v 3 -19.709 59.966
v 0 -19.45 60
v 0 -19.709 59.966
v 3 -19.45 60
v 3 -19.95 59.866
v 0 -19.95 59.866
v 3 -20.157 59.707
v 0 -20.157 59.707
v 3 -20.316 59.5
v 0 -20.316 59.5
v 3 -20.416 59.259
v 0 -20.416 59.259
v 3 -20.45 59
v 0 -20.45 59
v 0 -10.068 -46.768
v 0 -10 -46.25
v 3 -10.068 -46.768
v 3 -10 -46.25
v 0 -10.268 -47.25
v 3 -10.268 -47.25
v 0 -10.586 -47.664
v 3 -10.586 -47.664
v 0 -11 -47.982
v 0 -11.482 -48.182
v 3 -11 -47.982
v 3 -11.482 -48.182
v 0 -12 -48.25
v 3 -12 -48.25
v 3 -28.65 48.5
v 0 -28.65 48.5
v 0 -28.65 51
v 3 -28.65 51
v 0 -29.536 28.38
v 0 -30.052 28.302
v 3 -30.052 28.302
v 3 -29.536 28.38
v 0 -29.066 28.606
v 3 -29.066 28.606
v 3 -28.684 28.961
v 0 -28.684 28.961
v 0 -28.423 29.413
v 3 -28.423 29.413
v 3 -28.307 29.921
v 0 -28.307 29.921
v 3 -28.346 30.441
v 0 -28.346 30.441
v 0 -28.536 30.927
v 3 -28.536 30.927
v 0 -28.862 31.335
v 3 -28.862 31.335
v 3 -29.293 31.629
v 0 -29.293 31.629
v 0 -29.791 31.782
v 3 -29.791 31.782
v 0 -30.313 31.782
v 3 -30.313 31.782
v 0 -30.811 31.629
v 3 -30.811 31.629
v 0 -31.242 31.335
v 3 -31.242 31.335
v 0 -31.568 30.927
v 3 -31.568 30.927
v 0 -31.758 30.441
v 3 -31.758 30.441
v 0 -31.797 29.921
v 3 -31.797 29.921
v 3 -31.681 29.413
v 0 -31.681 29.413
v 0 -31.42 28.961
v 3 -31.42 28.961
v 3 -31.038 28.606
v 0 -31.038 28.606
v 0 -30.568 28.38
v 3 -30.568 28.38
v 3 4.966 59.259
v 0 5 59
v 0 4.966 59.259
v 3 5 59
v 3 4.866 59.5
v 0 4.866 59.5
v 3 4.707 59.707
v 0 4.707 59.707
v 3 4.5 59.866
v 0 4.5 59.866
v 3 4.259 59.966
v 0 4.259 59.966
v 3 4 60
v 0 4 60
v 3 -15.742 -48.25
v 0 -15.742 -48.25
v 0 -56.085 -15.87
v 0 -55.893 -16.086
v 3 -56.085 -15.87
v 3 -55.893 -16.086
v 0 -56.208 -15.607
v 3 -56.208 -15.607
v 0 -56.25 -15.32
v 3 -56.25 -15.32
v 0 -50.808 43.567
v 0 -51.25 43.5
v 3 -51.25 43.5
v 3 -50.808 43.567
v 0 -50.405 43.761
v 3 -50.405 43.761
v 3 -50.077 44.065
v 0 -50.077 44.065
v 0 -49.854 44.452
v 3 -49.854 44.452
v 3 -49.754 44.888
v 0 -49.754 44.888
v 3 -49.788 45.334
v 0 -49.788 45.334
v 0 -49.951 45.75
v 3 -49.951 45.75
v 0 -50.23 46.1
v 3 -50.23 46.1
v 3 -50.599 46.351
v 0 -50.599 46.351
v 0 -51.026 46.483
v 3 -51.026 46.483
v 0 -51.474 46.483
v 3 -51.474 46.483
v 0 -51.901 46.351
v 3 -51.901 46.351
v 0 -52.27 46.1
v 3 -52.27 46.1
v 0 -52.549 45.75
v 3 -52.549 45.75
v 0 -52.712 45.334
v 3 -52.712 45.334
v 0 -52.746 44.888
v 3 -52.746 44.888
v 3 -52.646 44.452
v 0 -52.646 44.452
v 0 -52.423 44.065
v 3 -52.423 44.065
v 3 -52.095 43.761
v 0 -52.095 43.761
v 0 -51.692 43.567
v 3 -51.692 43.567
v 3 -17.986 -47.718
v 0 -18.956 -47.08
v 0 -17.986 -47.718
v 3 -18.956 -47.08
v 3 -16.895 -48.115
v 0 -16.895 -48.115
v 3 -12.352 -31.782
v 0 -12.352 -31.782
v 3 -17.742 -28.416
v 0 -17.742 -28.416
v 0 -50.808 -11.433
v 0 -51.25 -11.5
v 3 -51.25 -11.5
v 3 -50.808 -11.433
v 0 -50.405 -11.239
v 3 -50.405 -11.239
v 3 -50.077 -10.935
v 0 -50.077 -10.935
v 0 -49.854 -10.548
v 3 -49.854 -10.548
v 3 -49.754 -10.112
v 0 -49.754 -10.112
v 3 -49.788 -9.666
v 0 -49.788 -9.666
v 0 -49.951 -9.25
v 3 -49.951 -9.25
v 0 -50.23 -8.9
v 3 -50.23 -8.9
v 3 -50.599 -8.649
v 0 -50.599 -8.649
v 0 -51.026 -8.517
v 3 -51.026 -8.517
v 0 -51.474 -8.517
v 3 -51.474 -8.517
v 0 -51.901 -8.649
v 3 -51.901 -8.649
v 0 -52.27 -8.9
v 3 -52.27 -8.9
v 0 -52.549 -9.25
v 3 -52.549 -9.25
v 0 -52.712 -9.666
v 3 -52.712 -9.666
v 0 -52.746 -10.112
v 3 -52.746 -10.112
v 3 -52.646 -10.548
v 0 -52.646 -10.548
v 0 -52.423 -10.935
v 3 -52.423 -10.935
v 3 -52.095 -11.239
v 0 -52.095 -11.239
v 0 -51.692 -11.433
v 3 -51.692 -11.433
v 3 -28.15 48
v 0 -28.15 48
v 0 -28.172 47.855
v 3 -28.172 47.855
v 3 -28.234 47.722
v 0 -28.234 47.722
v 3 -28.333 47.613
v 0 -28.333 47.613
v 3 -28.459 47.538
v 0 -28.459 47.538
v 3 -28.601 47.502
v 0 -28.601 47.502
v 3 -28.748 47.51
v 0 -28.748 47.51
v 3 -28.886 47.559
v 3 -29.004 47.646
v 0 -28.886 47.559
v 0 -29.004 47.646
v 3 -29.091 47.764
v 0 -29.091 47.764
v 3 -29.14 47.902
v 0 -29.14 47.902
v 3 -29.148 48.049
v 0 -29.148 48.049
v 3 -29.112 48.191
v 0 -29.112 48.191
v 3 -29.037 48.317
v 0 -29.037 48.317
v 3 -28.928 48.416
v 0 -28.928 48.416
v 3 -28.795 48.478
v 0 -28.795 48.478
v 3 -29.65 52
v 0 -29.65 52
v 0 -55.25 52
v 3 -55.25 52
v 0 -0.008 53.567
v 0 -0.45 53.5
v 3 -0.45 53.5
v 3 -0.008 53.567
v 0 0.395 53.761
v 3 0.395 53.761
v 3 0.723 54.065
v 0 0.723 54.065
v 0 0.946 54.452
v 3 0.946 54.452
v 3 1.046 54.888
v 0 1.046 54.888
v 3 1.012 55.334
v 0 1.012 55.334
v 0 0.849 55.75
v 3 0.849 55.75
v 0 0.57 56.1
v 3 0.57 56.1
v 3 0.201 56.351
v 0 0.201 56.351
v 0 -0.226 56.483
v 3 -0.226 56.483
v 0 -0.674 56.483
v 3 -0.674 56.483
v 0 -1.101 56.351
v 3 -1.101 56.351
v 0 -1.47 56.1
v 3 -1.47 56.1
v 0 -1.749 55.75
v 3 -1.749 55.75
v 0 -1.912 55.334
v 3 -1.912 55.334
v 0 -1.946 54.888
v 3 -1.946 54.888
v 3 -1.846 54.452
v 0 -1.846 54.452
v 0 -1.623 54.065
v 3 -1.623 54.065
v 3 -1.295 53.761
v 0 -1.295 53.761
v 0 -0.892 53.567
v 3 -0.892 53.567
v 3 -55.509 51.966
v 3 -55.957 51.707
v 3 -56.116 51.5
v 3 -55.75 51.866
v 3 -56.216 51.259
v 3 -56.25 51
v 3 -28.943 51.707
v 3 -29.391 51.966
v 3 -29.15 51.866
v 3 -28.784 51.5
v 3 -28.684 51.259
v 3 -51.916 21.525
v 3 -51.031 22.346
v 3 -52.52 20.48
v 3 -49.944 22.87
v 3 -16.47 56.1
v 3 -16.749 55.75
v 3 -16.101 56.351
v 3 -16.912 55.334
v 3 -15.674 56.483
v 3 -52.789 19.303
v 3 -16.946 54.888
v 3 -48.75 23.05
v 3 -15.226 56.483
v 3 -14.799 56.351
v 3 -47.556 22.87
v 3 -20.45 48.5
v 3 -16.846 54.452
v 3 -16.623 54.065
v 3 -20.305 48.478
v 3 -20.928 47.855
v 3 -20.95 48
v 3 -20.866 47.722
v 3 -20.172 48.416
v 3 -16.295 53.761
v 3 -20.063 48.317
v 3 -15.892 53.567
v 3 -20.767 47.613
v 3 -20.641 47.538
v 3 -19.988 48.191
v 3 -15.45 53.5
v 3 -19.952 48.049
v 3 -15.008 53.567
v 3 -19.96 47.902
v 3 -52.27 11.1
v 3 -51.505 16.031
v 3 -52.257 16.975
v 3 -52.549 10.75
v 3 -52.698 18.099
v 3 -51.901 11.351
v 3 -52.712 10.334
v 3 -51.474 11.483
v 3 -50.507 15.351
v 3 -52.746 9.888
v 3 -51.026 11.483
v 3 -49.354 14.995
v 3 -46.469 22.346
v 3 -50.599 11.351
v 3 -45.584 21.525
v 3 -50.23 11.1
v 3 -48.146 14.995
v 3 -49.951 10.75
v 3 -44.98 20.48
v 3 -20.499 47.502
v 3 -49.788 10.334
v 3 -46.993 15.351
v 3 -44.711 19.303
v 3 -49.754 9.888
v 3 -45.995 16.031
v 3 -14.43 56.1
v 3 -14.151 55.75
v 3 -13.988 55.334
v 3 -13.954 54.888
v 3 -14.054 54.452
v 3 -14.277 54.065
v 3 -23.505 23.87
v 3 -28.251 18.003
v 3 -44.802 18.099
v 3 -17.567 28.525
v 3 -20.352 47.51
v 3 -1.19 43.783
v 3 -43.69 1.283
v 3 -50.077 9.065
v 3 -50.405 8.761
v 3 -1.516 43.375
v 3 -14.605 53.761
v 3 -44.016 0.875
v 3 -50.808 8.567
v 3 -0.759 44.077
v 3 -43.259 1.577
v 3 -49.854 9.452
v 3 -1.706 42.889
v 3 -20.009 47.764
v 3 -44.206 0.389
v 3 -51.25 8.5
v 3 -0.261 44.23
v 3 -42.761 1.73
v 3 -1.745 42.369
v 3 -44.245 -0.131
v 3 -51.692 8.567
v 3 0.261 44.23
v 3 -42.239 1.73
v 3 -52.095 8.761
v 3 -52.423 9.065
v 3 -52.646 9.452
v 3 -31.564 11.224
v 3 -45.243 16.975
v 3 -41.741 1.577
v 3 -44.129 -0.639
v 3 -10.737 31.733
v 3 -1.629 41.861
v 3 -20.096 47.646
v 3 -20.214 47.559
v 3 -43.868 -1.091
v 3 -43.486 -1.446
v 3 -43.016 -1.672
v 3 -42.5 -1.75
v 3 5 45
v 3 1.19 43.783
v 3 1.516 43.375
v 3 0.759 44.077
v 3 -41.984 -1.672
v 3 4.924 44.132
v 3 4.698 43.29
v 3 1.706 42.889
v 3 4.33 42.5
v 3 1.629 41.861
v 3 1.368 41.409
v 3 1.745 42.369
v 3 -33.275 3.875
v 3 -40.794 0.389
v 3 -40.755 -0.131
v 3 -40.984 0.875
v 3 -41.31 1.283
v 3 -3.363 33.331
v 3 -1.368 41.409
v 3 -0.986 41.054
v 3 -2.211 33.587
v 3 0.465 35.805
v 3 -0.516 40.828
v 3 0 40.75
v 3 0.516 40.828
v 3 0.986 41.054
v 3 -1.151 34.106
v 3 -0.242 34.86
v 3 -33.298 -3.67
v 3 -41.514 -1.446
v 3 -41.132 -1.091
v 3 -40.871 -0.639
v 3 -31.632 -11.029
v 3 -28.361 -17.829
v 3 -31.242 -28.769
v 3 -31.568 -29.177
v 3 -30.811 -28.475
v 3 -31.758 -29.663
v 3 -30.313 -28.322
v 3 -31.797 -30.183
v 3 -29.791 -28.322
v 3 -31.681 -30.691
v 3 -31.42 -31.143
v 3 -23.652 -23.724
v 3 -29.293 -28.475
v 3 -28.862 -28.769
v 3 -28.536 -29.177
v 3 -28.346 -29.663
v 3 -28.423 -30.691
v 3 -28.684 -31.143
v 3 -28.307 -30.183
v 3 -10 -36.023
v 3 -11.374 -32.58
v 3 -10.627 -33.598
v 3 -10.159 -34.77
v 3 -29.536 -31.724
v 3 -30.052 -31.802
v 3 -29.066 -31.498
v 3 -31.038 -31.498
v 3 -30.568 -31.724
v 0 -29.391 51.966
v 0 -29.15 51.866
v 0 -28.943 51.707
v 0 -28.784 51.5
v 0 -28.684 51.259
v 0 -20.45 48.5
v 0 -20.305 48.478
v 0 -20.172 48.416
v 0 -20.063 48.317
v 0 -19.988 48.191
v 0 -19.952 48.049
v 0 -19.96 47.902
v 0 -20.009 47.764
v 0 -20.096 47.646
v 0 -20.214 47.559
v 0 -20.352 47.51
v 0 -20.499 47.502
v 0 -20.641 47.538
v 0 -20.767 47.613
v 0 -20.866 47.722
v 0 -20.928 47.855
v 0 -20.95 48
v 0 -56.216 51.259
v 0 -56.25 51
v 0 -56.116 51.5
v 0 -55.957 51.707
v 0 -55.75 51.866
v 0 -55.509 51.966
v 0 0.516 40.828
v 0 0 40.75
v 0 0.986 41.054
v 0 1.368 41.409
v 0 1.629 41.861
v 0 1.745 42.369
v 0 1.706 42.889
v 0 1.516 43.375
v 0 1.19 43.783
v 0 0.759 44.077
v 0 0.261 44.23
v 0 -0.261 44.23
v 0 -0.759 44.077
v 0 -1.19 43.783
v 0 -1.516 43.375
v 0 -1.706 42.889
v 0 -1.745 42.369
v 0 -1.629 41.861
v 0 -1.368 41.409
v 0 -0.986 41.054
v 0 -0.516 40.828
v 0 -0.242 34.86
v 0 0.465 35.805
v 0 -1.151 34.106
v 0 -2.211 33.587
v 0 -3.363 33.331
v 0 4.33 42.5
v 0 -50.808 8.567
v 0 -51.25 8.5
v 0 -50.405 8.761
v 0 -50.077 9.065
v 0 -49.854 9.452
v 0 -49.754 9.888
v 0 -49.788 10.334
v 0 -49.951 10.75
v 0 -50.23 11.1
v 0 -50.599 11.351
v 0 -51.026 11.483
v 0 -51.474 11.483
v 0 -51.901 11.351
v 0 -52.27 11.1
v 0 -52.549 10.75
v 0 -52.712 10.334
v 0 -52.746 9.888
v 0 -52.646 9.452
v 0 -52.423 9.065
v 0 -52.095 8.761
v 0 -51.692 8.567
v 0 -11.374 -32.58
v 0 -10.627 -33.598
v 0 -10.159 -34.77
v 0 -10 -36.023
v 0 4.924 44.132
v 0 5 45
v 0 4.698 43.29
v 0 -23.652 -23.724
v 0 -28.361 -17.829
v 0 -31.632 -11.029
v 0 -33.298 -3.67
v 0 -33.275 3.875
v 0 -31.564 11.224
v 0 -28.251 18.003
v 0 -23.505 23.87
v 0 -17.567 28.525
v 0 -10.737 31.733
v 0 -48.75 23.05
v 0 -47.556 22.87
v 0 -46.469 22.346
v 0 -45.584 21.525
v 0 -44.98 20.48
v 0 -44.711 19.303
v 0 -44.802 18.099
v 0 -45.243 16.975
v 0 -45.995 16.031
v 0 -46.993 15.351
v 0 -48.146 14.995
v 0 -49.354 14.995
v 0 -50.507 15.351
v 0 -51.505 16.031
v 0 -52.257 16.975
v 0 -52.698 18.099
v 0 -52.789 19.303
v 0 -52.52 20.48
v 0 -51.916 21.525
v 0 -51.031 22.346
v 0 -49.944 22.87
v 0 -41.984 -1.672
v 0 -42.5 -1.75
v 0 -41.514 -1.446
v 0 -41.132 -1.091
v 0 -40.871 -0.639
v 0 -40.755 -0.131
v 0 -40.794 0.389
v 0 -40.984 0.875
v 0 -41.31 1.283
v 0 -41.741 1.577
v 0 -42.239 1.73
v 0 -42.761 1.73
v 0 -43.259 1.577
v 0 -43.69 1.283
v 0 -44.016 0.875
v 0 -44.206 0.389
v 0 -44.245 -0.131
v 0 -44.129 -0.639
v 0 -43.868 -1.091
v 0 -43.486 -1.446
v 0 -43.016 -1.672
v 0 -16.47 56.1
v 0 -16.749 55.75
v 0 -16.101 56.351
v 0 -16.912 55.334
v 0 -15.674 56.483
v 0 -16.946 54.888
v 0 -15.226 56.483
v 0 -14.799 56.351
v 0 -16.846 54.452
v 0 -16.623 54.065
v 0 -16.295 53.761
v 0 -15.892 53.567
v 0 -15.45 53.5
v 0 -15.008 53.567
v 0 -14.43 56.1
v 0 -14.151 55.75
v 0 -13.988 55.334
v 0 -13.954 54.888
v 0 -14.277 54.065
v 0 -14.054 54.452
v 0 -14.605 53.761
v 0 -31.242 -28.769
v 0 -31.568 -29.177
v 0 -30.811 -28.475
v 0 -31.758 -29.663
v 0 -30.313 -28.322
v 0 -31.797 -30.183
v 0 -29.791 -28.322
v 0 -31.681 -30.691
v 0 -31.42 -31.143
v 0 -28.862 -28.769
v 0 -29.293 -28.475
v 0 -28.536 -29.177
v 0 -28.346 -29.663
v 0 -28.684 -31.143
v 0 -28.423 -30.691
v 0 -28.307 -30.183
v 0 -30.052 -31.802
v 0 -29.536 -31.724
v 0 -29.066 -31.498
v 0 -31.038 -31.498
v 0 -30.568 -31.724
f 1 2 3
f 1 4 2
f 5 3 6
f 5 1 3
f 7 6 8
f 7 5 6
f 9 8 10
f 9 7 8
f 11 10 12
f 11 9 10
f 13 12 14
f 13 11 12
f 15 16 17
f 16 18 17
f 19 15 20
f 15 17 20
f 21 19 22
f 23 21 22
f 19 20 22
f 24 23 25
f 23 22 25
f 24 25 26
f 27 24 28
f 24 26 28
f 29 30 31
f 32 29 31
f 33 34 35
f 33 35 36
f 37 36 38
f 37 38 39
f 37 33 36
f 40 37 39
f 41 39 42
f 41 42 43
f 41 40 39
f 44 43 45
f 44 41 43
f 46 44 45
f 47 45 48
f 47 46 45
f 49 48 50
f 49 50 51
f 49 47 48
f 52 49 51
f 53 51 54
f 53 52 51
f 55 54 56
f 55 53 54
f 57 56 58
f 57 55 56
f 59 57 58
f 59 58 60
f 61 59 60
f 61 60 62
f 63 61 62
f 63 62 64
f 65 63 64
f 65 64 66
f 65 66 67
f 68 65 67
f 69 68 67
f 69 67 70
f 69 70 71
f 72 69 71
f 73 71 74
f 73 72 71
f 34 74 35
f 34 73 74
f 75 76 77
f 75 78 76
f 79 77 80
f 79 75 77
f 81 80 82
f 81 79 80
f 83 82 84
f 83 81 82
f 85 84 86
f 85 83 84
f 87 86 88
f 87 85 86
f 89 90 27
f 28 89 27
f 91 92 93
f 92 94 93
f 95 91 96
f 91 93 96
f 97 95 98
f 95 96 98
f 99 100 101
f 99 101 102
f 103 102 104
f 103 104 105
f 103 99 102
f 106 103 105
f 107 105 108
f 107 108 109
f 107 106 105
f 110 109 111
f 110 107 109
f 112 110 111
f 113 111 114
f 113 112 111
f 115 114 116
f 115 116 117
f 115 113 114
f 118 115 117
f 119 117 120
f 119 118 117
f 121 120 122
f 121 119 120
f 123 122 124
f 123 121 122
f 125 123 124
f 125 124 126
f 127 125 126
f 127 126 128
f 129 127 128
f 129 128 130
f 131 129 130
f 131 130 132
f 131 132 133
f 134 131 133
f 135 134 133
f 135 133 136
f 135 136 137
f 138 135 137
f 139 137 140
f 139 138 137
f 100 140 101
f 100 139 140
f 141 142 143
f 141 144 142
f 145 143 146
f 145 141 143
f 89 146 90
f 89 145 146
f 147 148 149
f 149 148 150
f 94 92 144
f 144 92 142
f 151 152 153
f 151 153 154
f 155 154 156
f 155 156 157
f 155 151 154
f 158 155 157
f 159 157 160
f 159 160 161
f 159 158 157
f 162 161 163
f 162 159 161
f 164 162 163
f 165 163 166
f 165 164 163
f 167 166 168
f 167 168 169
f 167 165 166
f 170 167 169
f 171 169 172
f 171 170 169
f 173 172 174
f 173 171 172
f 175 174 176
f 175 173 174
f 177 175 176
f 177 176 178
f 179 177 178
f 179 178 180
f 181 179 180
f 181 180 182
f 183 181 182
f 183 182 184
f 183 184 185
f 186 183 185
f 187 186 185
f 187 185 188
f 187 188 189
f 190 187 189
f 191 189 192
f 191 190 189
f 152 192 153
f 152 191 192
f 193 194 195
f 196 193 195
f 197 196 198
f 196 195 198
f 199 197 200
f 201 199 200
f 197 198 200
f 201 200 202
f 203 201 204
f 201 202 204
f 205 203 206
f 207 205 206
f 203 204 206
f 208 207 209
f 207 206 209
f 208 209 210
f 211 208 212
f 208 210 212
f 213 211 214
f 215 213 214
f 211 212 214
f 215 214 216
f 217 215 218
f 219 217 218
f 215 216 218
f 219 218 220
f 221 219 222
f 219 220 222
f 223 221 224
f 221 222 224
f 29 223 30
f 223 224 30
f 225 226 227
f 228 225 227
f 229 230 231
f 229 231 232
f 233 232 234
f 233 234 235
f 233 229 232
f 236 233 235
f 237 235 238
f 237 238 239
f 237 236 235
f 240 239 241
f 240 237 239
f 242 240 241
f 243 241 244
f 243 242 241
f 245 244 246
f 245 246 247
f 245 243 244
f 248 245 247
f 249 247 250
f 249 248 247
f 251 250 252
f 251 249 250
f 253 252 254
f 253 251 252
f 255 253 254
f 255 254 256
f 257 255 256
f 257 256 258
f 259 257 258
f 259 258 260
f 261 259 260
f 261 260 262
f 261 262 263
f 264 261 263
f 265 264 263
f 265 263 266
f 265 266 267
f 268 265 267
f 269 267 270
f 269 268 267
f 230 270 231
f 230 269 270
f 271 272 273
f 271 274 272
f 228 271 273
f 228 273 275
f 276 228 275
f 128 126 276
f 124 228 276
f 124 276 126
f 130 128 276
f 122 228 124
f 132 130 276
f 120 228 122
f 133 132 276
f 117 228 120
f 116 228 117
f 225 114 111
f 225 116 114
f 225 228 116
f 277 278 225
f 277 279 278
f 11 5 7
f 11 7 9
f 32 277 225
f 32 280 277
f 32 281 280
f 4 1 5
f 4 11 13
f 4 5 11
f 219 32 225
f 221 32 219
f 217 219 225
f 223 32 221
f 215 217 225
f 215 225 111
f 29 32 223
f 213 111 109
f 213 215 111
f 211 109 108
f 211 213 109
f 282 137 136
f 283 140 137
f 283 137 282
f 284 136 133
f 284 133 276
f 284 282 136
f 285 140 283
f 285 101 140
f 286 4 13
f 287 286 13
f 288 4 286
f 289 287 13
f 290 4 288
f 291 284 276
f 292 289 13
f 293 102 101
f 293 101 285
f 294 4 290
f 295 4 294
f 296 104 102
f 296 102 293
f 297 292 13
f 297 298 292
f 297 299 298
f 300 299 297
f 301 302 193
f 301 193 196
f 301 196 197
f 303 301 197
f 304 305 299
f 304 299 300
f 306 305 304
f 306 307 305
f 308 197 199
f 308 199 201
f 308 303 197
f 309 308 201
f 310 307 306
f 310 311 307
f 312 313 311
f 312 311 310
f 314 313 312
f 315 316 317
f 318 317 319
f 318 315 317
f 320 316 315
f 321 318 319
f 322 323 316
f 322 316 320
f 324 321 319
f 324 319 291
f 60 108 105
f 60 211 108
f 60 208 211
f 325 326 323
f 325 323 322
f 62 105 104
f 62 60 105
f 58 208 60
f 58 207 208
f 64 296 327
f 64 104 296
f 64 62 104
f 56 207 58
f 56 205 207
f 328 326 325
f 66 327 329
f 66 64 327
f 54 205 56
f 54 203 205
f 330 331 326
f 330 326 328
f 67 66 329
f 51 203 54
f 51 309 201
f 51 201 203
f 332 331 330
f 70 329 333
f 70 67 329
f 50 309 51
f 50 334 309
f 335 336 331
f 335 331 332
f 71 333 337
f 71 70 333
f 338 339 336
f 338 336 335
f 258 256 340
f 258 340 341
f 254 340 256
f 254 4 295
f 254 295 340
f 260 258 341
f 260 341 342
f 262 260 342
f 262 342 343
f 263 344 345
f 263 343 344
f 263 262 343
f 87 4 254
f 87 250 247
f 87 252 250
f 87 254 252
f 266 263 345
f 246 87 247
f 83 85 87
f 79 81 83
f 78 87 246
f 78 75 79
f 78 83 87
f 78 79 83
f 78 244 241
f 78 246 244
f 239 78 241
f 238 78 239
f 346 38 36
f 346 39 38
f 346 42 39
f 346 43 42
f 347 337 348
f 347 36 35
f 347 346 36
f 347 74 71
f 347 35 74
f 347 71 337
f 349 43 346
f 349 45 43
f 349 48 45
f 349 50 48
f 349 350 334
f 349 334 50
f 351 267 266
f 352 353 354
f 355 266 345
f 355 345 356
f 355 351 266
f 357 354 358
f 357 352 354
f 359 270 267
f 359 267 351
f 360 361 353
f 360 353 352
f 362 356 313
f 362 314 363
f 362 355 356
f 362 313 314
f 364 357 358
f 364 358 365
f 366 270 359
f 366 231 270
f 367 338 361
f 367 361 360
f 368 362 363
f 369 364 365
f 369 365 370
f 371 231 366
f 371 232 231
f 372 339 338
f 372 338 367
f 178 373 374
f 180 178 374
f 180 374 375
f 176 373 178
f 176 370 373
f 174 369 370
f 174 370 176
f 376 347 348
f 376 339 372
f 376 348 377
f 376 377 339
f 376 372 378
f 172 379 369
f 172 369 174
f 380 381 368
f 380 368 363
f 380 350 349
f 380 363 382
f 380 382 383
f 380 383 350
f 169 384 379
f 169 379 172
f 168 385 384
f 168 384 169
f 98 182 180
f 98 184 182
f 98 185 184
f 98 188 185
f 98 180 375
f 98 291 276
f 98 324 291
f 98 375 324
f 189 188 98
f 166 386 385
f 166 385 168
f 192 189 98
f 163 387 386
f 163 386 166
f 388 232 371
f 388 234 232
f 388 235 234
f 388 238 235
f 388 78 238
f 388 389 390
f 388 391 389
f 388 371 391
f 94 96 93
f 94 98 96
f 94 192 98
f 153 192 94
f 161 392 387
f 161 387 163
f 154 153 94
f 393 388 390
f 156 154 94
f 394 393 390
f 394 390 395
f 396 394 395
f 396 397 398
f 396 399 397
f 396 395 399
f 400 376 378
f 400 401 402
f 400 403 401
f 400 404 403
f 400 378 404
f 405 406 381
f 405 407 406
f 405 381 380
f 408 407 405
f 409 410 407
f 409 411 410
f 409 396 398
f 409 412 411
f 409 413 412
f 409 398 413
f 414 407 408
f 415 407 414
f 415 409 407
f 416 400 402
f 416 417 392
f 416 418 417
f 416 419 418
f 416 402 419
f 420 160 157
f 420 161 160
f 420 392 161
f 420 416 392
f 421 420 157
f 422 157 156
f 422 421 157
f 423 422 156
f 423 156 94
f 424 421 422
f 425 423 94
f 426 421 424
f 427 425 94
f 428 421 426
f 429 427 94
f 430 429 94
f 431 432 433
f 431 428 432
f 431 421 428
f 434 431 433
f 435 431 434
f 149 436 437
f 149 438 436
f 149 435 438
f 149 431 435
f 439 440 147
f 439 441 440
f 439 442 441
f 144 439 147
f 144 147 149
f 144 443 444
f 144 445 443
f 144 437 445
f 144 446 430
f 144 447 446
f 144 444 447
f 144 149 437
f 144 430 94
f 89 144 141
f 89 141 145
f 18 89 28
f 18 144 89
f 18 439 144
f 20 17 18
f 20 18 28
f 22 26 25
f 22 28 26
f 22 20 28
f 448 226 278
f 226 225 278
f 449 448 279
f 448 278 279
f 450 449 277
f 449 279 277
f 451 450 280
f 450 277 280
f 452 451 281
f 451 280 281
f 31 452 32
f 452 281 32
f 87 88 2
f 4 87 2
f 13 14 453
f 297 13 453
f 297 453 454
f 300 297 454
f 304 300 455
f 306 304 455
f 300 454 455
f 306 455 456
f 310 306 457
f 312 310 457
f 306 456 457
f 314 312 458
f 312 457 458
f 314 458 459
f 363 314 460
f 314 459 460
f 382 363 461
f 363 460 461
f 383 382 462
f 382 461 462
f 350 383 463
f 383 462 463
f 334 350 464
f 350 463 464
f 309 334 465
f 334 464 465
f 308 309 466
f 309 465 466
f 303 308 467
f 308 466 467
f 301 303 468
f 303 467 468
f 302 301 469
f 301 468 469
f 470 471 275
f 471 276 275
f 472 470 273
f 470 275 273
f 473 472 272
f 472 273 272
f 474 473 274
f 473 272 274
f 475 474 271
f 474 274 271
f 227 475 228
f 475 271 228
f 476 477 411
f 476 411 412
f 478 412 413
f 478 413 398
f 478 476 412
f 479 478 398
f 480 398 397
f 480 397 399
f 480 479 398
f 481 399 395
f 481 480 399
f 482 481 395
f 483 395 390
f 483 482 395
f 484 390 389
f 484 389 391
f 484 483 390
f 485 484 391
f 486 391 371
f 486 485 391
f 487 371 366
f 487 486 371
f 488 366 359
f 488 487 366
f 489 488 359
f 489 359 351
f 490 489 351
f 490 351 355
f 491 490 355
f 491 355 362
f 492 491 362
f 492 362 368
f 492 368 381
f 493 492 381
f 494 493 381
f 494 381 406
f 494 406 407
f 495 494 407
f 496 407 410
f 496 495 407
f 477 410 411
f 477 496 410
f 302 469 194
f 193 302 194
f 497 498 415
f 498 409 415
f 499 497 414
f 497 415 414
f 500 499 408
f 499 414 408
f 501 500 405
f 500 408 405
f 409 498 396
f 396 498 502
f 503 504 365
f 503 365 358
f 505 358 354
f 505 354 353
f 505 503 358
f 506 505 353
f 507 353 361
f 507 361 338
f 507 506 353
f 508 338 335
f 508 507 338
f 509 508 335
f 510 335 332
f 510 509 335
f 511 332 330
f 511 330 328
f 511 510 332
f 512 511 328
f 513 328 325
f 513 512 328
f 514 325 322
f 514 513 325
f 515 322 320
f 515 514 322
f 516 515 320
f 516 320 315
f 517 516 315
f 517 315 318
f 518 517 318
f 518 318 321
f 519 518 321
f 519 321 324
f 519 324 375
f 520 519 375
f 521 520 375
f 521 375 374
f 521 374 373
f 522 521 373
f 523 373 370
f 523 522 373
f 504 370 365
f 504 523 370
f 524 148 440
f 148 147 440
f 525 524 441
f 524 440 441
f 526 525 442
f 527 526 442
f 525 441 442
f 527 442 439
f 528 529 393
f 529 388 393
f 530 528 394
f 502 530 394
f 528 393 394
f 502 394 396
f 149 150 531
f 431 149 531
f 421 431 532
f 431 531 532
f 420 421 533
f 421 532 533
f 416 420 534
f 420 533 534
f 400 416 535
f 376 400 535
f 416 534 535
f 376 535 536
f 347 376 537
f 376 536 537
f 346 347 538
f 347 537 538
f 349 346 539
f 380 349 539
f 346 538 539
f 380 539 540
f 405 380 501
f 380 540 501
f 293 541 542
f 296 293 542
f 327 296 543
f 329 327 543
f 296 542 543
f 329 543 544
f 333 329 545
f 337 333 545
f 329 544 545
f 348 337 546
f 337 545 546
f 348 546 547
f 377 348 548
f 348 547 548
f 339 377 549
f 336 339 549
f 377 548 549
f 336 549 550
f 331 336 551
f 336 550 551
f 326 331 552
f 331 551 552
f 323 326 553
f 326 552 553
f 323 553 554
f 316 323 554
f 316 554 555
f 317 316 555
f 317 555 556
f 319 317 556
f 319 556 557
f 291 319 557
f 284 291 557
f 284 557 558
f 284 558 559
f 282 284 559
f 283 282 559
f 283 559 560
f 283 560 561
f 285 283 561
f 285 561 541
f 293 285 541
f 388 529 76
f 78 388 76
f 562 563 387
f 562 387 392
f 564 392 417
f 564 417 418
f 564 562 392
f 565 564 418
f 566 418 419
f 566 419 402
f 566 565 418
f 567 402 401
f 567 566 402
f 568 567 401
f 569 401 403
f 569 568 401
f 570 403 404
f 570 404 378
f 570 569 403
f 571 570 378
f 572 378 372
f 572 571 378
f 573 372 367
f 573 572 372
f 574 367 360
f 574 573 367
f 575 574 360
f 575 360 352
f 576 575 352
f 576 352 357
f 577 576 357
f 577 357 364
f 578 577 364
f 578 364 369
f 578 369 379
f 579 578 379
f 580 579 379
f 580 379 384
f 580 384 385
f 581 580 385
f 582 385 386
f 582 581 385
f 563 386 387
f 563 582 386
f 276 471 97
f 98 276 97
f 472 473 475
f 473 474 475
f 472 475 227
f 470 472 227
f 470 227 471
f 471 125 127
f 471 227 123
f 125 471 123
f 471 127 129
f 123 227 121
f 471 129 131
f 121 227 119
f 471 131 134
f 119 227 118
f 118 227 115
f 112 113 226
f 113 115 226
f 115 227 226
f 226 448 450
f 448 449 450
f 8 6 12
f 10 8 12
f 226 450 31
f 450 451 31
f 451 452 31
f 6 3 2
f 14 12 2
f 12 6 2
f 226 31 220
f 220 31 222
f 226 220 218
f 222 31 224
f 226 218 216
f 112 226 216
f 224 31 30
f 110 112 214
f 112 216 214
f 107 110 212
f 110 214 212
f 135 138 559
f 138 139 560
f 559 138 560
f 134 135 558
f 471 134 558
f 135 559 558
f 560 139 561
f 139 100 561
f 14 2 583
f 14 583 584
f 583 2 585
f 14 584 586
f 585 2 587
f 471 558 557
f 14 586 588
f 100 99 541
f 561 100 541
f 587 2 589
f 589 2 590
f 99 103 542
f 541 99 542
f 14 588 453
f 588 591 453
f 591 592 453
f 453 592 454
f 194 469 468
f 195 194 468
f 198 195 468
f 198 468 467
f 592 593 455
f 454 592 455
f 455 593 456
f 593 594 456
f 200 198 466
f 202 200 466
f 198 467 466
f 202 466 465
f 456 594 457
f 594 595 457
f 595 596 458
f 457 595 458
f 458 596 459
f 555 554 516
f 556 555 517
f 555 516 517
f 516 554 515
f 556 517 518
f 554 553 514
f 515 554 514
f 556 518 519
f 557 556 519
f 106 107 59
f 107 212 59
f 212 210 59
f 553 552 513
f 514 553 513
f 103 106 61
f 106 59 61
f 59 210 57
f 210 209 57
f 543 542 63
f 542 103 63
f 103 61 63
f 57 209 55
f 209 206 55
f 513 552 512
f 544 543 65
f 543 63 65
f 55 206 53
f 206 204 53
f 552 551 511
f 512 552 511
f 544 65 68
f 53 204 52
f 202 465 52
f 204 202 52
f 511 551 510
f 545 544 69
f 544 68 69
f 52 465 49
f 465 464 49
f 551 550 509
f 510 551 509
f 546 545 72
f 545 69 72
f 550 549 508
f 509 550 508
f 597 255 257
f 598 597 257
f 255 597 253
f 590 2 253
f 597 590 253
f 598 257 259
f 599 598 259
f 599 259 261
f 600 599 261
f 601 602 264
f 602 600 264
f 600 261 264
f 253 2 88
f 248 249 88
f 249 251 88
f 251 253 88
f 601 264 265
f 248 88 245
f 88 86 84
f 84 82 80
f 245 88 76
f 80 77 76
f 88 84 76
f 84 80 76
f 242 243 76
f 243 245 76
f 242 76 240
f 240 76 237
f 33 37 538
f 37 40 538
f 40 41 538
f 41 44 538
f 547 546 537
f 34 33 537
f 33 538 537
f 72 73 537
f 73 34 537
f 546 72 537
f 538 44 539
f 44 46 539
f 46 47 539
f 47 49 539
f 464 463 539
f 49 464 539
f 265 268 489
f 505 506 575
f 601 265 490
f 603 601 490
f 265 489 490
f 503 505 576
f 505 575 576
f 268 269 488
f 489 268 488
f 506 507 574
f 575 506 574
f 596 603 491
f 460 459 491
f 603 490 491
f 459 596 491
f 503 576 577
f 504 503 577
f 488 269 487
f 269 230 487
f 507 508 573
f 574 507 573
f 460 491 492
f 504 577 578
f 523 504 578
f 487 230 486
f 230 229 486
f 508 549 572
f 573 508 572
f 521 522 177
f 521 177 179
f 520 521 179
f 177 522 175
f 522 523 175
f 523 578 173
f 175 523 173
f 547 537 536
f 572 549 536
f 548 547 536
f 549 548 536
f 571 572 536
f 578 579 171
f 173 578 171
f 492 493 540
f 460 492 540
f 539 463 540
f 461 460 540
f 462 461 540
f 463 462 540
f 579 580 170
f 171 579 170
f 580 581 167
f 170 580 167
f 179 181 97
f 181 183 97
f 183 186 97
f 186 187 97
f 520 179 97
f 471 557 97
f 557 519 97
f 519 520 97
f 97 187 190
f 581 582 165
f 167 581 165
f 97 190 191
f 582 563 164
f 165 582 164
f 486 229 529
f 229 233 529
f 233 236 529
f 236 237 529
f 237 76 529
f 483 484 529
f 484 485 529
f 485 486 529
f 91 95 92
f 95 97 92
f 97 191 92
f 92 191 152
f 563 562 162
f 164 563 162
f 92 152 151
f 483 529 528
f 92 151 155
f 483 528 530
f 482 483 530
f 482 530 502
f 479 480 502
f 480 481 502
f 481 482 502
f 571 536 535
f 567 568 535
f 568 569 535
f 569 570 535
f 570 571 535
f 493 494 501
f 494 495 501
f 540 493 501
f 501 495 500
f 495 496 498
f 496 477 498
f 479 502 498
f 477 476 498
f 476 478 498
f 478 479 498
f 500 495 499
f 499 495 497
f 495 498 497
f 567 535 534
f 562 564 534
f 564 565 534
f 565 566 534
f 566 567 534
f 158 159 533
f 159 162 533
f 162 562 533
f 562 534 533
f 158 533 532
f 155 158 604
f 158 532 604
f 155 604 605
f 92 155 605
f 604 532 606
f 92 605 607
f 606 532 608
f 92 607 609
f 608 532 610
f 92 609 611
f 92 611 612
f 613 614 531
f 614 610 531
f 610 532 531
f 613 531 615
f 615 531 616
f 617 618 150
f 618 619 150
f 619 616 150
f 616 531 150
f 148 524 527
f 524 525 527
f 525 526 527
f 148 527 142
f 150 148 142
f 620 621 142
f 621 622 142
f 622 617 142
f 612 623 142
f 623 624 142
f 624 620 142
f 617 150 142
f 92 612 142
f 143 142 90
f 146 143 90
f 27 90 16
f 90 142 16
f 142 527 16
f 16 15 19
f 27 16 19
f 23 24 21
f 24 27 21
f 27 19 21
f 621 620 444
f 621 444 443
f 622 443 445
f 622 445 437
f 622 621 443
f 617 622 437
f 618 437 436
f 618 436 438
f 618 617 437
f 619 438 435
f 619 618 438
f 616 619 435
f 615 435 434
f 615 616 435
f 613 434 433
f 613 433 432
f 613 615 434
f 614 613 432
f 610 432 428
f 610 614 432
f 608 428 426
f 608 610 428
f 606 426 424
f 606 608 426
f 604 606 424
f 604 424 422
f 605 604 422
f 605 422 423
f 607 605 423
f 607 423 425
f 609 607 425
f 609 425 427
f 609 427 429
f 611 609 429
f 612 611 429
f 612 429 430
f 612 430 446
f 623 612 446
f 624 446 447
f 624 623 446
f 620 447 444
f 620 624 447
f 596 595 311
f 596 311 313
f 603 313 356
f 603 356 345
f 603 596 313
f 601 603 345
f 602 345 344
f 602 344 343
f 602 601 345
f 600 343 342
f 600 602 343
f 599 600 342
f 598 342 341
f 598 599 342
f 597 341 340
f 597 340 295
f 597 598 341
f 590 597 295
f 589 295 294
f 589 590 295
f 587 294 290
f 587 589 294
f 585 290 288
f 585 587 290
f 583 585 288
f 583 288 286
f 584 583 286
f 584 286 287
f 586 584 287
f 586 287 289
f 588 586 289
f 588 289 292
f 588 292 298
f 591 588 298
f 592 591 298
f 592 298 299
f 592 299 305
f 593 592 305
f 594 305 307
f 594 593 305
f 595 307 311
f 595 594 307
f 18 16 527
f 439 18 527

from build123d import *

# Parameters (mm, degrees)
SKETCH_1_R          = 1.5
SKETCH_1_R_2        = 1.75
EXTRUDE_1_DEPTH     = 3
FILLET_1_R          = 5
SKETCH_2_R          = 0.5
CUT_EXTRUDE_1_DEPTH = 10
FILLET_2_R          = 2
SKETCH_3_R          = 4.05
CUT_EXTRUDE_2_DEPTH = 10
FILLET_3_R          = 1


with BuildPart() as part:
    # 草图1 → 凸台-拉伸1 (new body)
    with BuildSketch(Plane(origin=(0, 0, 0), x_dir=(0, 0, -1), z_dir=(1, 0, 0))):
        with BuildLine():
            Line((-48, -20.45), (-48, -28.65))
            Line((-48, -28.65), (-52, -28.65))
            Line((-52, -28.65), (-52, -56.25))
            Line((-52, -56.25), (15.786547457, -56.25))
            Line((15.786547457, -56.25), (48.25, -17.561563803))
            Line((48.25, -17.561563803), (48.25, -10))
            Line((48.25, -10), (33.25, -10))
            Line((33.25, -10), (28.415845032, -17.74231527))
            ThreePointArc((28.415845032, -17.74231527), (-8.807963632, -32.321351714), (-33.488633754, -0.872587709))
            Line((-33.488633754, -0.872587709), (-43.660254038, 5))
            Line((-43.660254038, 5), (-60, 5))
            Line((-60, 5), (-60, -20.45))
            Line((-60, -20.45), (-48, -20.45))
        make_face()
        with Locations((-45, -51.25)):
            Circle(SKETCH_1_R, mode=Mode.SUBTRACT)
        with Locations((-10, -51.25)):
            Circle(SKETCH_1_R, mode=Mode.SUBTRACT)
        with Locations((-30.0520382, -30.0520382)):
            Circle(SKETCH_1_R_2, mode=Mode.SUBTRACT)
        with Locations((10, -51.25)):
            Circle(SKETCH_1_R, mode=Mode.SUBTRACT)
        with Locations((0, -42.5)):
            Circle(SKETCH_1_R_2, mode=Mode.SUBTRACT)
        with Locations((30.0520382, -30.0520382)):
            Circle(SKETCH_1_R_2, mode=Mode.SUBTRACT)
        with Locations((-55, -15.45)):
            Circle(SKETCH_1_R, mode=Mode.SUBTRACT)
        with Locations((-55, -0.45)):
            Circle(SKETCH_1_R, mode=Mode.SUBTRACT)
        with Locations((-42.5, 0)):
            Circle(SKETCH_1_R_2, mode=Mode.SUBTRACT)
    extrude(amount=EXTRUDE_1_DEPTH)

    # 圆角1
    fillet_1_edges = [part.edges().sort_by_distance(p)[0] for p in [
        (1.5, -10, -33.25),
        (1.5, -17.561563803, -48.25),
        (1.5, 5, 43.660254038),
        (1.5, -0.872587709, 33.488633754),
    ]]
    fillet(fillet_1_edges, radius=FILLET_1_R)

    # 草图2 → 切除-拉伸1 (cut)
    with BuildSketch(Plane.ZY):
        with Locations((48, -20.45)):
            Circle(SKETCH_2_R)
        with Locations((48, -28.65)):
            Circle(SKETCH_2_R)
    extrude(amount=-CUT_EXTRUDE_1_DEPTH, mode=Mode.SUBTRACT)

    # 圆角2
    fillet_2_edges = [part.edges().sort_by_distance(p)[0] for p in [
        (1.5, -10, -48.25),
    ]]
    fillet(fillet_2_edges, radius=FILLET_2_R)

    # 草图3 → 切除-拉伸2 (cut)
    with BuildSketch(Plane.ZY):
        with Locations((19, -48.75)):
            Circle(SKETCH_3_R)
    extrude(amount=-CUT_EXTRUDE_2_DEPTH, mode=Mode.SUBTRACT)

    # 圆角3
    fillet_3_edges = [part.edges().sort_by_distance(p)[0] for p in [
        (1.5, -56.25, -15.786547457),
        (1.5, -56.25, 52),
        (1.5, -28.65, 52),
        (1.5, -20.45, 60),
        (1.5, 5, 60),
    ]]
    fillet(fillet_3_edges, radius=FILLET_3_R)


solid = part.part
